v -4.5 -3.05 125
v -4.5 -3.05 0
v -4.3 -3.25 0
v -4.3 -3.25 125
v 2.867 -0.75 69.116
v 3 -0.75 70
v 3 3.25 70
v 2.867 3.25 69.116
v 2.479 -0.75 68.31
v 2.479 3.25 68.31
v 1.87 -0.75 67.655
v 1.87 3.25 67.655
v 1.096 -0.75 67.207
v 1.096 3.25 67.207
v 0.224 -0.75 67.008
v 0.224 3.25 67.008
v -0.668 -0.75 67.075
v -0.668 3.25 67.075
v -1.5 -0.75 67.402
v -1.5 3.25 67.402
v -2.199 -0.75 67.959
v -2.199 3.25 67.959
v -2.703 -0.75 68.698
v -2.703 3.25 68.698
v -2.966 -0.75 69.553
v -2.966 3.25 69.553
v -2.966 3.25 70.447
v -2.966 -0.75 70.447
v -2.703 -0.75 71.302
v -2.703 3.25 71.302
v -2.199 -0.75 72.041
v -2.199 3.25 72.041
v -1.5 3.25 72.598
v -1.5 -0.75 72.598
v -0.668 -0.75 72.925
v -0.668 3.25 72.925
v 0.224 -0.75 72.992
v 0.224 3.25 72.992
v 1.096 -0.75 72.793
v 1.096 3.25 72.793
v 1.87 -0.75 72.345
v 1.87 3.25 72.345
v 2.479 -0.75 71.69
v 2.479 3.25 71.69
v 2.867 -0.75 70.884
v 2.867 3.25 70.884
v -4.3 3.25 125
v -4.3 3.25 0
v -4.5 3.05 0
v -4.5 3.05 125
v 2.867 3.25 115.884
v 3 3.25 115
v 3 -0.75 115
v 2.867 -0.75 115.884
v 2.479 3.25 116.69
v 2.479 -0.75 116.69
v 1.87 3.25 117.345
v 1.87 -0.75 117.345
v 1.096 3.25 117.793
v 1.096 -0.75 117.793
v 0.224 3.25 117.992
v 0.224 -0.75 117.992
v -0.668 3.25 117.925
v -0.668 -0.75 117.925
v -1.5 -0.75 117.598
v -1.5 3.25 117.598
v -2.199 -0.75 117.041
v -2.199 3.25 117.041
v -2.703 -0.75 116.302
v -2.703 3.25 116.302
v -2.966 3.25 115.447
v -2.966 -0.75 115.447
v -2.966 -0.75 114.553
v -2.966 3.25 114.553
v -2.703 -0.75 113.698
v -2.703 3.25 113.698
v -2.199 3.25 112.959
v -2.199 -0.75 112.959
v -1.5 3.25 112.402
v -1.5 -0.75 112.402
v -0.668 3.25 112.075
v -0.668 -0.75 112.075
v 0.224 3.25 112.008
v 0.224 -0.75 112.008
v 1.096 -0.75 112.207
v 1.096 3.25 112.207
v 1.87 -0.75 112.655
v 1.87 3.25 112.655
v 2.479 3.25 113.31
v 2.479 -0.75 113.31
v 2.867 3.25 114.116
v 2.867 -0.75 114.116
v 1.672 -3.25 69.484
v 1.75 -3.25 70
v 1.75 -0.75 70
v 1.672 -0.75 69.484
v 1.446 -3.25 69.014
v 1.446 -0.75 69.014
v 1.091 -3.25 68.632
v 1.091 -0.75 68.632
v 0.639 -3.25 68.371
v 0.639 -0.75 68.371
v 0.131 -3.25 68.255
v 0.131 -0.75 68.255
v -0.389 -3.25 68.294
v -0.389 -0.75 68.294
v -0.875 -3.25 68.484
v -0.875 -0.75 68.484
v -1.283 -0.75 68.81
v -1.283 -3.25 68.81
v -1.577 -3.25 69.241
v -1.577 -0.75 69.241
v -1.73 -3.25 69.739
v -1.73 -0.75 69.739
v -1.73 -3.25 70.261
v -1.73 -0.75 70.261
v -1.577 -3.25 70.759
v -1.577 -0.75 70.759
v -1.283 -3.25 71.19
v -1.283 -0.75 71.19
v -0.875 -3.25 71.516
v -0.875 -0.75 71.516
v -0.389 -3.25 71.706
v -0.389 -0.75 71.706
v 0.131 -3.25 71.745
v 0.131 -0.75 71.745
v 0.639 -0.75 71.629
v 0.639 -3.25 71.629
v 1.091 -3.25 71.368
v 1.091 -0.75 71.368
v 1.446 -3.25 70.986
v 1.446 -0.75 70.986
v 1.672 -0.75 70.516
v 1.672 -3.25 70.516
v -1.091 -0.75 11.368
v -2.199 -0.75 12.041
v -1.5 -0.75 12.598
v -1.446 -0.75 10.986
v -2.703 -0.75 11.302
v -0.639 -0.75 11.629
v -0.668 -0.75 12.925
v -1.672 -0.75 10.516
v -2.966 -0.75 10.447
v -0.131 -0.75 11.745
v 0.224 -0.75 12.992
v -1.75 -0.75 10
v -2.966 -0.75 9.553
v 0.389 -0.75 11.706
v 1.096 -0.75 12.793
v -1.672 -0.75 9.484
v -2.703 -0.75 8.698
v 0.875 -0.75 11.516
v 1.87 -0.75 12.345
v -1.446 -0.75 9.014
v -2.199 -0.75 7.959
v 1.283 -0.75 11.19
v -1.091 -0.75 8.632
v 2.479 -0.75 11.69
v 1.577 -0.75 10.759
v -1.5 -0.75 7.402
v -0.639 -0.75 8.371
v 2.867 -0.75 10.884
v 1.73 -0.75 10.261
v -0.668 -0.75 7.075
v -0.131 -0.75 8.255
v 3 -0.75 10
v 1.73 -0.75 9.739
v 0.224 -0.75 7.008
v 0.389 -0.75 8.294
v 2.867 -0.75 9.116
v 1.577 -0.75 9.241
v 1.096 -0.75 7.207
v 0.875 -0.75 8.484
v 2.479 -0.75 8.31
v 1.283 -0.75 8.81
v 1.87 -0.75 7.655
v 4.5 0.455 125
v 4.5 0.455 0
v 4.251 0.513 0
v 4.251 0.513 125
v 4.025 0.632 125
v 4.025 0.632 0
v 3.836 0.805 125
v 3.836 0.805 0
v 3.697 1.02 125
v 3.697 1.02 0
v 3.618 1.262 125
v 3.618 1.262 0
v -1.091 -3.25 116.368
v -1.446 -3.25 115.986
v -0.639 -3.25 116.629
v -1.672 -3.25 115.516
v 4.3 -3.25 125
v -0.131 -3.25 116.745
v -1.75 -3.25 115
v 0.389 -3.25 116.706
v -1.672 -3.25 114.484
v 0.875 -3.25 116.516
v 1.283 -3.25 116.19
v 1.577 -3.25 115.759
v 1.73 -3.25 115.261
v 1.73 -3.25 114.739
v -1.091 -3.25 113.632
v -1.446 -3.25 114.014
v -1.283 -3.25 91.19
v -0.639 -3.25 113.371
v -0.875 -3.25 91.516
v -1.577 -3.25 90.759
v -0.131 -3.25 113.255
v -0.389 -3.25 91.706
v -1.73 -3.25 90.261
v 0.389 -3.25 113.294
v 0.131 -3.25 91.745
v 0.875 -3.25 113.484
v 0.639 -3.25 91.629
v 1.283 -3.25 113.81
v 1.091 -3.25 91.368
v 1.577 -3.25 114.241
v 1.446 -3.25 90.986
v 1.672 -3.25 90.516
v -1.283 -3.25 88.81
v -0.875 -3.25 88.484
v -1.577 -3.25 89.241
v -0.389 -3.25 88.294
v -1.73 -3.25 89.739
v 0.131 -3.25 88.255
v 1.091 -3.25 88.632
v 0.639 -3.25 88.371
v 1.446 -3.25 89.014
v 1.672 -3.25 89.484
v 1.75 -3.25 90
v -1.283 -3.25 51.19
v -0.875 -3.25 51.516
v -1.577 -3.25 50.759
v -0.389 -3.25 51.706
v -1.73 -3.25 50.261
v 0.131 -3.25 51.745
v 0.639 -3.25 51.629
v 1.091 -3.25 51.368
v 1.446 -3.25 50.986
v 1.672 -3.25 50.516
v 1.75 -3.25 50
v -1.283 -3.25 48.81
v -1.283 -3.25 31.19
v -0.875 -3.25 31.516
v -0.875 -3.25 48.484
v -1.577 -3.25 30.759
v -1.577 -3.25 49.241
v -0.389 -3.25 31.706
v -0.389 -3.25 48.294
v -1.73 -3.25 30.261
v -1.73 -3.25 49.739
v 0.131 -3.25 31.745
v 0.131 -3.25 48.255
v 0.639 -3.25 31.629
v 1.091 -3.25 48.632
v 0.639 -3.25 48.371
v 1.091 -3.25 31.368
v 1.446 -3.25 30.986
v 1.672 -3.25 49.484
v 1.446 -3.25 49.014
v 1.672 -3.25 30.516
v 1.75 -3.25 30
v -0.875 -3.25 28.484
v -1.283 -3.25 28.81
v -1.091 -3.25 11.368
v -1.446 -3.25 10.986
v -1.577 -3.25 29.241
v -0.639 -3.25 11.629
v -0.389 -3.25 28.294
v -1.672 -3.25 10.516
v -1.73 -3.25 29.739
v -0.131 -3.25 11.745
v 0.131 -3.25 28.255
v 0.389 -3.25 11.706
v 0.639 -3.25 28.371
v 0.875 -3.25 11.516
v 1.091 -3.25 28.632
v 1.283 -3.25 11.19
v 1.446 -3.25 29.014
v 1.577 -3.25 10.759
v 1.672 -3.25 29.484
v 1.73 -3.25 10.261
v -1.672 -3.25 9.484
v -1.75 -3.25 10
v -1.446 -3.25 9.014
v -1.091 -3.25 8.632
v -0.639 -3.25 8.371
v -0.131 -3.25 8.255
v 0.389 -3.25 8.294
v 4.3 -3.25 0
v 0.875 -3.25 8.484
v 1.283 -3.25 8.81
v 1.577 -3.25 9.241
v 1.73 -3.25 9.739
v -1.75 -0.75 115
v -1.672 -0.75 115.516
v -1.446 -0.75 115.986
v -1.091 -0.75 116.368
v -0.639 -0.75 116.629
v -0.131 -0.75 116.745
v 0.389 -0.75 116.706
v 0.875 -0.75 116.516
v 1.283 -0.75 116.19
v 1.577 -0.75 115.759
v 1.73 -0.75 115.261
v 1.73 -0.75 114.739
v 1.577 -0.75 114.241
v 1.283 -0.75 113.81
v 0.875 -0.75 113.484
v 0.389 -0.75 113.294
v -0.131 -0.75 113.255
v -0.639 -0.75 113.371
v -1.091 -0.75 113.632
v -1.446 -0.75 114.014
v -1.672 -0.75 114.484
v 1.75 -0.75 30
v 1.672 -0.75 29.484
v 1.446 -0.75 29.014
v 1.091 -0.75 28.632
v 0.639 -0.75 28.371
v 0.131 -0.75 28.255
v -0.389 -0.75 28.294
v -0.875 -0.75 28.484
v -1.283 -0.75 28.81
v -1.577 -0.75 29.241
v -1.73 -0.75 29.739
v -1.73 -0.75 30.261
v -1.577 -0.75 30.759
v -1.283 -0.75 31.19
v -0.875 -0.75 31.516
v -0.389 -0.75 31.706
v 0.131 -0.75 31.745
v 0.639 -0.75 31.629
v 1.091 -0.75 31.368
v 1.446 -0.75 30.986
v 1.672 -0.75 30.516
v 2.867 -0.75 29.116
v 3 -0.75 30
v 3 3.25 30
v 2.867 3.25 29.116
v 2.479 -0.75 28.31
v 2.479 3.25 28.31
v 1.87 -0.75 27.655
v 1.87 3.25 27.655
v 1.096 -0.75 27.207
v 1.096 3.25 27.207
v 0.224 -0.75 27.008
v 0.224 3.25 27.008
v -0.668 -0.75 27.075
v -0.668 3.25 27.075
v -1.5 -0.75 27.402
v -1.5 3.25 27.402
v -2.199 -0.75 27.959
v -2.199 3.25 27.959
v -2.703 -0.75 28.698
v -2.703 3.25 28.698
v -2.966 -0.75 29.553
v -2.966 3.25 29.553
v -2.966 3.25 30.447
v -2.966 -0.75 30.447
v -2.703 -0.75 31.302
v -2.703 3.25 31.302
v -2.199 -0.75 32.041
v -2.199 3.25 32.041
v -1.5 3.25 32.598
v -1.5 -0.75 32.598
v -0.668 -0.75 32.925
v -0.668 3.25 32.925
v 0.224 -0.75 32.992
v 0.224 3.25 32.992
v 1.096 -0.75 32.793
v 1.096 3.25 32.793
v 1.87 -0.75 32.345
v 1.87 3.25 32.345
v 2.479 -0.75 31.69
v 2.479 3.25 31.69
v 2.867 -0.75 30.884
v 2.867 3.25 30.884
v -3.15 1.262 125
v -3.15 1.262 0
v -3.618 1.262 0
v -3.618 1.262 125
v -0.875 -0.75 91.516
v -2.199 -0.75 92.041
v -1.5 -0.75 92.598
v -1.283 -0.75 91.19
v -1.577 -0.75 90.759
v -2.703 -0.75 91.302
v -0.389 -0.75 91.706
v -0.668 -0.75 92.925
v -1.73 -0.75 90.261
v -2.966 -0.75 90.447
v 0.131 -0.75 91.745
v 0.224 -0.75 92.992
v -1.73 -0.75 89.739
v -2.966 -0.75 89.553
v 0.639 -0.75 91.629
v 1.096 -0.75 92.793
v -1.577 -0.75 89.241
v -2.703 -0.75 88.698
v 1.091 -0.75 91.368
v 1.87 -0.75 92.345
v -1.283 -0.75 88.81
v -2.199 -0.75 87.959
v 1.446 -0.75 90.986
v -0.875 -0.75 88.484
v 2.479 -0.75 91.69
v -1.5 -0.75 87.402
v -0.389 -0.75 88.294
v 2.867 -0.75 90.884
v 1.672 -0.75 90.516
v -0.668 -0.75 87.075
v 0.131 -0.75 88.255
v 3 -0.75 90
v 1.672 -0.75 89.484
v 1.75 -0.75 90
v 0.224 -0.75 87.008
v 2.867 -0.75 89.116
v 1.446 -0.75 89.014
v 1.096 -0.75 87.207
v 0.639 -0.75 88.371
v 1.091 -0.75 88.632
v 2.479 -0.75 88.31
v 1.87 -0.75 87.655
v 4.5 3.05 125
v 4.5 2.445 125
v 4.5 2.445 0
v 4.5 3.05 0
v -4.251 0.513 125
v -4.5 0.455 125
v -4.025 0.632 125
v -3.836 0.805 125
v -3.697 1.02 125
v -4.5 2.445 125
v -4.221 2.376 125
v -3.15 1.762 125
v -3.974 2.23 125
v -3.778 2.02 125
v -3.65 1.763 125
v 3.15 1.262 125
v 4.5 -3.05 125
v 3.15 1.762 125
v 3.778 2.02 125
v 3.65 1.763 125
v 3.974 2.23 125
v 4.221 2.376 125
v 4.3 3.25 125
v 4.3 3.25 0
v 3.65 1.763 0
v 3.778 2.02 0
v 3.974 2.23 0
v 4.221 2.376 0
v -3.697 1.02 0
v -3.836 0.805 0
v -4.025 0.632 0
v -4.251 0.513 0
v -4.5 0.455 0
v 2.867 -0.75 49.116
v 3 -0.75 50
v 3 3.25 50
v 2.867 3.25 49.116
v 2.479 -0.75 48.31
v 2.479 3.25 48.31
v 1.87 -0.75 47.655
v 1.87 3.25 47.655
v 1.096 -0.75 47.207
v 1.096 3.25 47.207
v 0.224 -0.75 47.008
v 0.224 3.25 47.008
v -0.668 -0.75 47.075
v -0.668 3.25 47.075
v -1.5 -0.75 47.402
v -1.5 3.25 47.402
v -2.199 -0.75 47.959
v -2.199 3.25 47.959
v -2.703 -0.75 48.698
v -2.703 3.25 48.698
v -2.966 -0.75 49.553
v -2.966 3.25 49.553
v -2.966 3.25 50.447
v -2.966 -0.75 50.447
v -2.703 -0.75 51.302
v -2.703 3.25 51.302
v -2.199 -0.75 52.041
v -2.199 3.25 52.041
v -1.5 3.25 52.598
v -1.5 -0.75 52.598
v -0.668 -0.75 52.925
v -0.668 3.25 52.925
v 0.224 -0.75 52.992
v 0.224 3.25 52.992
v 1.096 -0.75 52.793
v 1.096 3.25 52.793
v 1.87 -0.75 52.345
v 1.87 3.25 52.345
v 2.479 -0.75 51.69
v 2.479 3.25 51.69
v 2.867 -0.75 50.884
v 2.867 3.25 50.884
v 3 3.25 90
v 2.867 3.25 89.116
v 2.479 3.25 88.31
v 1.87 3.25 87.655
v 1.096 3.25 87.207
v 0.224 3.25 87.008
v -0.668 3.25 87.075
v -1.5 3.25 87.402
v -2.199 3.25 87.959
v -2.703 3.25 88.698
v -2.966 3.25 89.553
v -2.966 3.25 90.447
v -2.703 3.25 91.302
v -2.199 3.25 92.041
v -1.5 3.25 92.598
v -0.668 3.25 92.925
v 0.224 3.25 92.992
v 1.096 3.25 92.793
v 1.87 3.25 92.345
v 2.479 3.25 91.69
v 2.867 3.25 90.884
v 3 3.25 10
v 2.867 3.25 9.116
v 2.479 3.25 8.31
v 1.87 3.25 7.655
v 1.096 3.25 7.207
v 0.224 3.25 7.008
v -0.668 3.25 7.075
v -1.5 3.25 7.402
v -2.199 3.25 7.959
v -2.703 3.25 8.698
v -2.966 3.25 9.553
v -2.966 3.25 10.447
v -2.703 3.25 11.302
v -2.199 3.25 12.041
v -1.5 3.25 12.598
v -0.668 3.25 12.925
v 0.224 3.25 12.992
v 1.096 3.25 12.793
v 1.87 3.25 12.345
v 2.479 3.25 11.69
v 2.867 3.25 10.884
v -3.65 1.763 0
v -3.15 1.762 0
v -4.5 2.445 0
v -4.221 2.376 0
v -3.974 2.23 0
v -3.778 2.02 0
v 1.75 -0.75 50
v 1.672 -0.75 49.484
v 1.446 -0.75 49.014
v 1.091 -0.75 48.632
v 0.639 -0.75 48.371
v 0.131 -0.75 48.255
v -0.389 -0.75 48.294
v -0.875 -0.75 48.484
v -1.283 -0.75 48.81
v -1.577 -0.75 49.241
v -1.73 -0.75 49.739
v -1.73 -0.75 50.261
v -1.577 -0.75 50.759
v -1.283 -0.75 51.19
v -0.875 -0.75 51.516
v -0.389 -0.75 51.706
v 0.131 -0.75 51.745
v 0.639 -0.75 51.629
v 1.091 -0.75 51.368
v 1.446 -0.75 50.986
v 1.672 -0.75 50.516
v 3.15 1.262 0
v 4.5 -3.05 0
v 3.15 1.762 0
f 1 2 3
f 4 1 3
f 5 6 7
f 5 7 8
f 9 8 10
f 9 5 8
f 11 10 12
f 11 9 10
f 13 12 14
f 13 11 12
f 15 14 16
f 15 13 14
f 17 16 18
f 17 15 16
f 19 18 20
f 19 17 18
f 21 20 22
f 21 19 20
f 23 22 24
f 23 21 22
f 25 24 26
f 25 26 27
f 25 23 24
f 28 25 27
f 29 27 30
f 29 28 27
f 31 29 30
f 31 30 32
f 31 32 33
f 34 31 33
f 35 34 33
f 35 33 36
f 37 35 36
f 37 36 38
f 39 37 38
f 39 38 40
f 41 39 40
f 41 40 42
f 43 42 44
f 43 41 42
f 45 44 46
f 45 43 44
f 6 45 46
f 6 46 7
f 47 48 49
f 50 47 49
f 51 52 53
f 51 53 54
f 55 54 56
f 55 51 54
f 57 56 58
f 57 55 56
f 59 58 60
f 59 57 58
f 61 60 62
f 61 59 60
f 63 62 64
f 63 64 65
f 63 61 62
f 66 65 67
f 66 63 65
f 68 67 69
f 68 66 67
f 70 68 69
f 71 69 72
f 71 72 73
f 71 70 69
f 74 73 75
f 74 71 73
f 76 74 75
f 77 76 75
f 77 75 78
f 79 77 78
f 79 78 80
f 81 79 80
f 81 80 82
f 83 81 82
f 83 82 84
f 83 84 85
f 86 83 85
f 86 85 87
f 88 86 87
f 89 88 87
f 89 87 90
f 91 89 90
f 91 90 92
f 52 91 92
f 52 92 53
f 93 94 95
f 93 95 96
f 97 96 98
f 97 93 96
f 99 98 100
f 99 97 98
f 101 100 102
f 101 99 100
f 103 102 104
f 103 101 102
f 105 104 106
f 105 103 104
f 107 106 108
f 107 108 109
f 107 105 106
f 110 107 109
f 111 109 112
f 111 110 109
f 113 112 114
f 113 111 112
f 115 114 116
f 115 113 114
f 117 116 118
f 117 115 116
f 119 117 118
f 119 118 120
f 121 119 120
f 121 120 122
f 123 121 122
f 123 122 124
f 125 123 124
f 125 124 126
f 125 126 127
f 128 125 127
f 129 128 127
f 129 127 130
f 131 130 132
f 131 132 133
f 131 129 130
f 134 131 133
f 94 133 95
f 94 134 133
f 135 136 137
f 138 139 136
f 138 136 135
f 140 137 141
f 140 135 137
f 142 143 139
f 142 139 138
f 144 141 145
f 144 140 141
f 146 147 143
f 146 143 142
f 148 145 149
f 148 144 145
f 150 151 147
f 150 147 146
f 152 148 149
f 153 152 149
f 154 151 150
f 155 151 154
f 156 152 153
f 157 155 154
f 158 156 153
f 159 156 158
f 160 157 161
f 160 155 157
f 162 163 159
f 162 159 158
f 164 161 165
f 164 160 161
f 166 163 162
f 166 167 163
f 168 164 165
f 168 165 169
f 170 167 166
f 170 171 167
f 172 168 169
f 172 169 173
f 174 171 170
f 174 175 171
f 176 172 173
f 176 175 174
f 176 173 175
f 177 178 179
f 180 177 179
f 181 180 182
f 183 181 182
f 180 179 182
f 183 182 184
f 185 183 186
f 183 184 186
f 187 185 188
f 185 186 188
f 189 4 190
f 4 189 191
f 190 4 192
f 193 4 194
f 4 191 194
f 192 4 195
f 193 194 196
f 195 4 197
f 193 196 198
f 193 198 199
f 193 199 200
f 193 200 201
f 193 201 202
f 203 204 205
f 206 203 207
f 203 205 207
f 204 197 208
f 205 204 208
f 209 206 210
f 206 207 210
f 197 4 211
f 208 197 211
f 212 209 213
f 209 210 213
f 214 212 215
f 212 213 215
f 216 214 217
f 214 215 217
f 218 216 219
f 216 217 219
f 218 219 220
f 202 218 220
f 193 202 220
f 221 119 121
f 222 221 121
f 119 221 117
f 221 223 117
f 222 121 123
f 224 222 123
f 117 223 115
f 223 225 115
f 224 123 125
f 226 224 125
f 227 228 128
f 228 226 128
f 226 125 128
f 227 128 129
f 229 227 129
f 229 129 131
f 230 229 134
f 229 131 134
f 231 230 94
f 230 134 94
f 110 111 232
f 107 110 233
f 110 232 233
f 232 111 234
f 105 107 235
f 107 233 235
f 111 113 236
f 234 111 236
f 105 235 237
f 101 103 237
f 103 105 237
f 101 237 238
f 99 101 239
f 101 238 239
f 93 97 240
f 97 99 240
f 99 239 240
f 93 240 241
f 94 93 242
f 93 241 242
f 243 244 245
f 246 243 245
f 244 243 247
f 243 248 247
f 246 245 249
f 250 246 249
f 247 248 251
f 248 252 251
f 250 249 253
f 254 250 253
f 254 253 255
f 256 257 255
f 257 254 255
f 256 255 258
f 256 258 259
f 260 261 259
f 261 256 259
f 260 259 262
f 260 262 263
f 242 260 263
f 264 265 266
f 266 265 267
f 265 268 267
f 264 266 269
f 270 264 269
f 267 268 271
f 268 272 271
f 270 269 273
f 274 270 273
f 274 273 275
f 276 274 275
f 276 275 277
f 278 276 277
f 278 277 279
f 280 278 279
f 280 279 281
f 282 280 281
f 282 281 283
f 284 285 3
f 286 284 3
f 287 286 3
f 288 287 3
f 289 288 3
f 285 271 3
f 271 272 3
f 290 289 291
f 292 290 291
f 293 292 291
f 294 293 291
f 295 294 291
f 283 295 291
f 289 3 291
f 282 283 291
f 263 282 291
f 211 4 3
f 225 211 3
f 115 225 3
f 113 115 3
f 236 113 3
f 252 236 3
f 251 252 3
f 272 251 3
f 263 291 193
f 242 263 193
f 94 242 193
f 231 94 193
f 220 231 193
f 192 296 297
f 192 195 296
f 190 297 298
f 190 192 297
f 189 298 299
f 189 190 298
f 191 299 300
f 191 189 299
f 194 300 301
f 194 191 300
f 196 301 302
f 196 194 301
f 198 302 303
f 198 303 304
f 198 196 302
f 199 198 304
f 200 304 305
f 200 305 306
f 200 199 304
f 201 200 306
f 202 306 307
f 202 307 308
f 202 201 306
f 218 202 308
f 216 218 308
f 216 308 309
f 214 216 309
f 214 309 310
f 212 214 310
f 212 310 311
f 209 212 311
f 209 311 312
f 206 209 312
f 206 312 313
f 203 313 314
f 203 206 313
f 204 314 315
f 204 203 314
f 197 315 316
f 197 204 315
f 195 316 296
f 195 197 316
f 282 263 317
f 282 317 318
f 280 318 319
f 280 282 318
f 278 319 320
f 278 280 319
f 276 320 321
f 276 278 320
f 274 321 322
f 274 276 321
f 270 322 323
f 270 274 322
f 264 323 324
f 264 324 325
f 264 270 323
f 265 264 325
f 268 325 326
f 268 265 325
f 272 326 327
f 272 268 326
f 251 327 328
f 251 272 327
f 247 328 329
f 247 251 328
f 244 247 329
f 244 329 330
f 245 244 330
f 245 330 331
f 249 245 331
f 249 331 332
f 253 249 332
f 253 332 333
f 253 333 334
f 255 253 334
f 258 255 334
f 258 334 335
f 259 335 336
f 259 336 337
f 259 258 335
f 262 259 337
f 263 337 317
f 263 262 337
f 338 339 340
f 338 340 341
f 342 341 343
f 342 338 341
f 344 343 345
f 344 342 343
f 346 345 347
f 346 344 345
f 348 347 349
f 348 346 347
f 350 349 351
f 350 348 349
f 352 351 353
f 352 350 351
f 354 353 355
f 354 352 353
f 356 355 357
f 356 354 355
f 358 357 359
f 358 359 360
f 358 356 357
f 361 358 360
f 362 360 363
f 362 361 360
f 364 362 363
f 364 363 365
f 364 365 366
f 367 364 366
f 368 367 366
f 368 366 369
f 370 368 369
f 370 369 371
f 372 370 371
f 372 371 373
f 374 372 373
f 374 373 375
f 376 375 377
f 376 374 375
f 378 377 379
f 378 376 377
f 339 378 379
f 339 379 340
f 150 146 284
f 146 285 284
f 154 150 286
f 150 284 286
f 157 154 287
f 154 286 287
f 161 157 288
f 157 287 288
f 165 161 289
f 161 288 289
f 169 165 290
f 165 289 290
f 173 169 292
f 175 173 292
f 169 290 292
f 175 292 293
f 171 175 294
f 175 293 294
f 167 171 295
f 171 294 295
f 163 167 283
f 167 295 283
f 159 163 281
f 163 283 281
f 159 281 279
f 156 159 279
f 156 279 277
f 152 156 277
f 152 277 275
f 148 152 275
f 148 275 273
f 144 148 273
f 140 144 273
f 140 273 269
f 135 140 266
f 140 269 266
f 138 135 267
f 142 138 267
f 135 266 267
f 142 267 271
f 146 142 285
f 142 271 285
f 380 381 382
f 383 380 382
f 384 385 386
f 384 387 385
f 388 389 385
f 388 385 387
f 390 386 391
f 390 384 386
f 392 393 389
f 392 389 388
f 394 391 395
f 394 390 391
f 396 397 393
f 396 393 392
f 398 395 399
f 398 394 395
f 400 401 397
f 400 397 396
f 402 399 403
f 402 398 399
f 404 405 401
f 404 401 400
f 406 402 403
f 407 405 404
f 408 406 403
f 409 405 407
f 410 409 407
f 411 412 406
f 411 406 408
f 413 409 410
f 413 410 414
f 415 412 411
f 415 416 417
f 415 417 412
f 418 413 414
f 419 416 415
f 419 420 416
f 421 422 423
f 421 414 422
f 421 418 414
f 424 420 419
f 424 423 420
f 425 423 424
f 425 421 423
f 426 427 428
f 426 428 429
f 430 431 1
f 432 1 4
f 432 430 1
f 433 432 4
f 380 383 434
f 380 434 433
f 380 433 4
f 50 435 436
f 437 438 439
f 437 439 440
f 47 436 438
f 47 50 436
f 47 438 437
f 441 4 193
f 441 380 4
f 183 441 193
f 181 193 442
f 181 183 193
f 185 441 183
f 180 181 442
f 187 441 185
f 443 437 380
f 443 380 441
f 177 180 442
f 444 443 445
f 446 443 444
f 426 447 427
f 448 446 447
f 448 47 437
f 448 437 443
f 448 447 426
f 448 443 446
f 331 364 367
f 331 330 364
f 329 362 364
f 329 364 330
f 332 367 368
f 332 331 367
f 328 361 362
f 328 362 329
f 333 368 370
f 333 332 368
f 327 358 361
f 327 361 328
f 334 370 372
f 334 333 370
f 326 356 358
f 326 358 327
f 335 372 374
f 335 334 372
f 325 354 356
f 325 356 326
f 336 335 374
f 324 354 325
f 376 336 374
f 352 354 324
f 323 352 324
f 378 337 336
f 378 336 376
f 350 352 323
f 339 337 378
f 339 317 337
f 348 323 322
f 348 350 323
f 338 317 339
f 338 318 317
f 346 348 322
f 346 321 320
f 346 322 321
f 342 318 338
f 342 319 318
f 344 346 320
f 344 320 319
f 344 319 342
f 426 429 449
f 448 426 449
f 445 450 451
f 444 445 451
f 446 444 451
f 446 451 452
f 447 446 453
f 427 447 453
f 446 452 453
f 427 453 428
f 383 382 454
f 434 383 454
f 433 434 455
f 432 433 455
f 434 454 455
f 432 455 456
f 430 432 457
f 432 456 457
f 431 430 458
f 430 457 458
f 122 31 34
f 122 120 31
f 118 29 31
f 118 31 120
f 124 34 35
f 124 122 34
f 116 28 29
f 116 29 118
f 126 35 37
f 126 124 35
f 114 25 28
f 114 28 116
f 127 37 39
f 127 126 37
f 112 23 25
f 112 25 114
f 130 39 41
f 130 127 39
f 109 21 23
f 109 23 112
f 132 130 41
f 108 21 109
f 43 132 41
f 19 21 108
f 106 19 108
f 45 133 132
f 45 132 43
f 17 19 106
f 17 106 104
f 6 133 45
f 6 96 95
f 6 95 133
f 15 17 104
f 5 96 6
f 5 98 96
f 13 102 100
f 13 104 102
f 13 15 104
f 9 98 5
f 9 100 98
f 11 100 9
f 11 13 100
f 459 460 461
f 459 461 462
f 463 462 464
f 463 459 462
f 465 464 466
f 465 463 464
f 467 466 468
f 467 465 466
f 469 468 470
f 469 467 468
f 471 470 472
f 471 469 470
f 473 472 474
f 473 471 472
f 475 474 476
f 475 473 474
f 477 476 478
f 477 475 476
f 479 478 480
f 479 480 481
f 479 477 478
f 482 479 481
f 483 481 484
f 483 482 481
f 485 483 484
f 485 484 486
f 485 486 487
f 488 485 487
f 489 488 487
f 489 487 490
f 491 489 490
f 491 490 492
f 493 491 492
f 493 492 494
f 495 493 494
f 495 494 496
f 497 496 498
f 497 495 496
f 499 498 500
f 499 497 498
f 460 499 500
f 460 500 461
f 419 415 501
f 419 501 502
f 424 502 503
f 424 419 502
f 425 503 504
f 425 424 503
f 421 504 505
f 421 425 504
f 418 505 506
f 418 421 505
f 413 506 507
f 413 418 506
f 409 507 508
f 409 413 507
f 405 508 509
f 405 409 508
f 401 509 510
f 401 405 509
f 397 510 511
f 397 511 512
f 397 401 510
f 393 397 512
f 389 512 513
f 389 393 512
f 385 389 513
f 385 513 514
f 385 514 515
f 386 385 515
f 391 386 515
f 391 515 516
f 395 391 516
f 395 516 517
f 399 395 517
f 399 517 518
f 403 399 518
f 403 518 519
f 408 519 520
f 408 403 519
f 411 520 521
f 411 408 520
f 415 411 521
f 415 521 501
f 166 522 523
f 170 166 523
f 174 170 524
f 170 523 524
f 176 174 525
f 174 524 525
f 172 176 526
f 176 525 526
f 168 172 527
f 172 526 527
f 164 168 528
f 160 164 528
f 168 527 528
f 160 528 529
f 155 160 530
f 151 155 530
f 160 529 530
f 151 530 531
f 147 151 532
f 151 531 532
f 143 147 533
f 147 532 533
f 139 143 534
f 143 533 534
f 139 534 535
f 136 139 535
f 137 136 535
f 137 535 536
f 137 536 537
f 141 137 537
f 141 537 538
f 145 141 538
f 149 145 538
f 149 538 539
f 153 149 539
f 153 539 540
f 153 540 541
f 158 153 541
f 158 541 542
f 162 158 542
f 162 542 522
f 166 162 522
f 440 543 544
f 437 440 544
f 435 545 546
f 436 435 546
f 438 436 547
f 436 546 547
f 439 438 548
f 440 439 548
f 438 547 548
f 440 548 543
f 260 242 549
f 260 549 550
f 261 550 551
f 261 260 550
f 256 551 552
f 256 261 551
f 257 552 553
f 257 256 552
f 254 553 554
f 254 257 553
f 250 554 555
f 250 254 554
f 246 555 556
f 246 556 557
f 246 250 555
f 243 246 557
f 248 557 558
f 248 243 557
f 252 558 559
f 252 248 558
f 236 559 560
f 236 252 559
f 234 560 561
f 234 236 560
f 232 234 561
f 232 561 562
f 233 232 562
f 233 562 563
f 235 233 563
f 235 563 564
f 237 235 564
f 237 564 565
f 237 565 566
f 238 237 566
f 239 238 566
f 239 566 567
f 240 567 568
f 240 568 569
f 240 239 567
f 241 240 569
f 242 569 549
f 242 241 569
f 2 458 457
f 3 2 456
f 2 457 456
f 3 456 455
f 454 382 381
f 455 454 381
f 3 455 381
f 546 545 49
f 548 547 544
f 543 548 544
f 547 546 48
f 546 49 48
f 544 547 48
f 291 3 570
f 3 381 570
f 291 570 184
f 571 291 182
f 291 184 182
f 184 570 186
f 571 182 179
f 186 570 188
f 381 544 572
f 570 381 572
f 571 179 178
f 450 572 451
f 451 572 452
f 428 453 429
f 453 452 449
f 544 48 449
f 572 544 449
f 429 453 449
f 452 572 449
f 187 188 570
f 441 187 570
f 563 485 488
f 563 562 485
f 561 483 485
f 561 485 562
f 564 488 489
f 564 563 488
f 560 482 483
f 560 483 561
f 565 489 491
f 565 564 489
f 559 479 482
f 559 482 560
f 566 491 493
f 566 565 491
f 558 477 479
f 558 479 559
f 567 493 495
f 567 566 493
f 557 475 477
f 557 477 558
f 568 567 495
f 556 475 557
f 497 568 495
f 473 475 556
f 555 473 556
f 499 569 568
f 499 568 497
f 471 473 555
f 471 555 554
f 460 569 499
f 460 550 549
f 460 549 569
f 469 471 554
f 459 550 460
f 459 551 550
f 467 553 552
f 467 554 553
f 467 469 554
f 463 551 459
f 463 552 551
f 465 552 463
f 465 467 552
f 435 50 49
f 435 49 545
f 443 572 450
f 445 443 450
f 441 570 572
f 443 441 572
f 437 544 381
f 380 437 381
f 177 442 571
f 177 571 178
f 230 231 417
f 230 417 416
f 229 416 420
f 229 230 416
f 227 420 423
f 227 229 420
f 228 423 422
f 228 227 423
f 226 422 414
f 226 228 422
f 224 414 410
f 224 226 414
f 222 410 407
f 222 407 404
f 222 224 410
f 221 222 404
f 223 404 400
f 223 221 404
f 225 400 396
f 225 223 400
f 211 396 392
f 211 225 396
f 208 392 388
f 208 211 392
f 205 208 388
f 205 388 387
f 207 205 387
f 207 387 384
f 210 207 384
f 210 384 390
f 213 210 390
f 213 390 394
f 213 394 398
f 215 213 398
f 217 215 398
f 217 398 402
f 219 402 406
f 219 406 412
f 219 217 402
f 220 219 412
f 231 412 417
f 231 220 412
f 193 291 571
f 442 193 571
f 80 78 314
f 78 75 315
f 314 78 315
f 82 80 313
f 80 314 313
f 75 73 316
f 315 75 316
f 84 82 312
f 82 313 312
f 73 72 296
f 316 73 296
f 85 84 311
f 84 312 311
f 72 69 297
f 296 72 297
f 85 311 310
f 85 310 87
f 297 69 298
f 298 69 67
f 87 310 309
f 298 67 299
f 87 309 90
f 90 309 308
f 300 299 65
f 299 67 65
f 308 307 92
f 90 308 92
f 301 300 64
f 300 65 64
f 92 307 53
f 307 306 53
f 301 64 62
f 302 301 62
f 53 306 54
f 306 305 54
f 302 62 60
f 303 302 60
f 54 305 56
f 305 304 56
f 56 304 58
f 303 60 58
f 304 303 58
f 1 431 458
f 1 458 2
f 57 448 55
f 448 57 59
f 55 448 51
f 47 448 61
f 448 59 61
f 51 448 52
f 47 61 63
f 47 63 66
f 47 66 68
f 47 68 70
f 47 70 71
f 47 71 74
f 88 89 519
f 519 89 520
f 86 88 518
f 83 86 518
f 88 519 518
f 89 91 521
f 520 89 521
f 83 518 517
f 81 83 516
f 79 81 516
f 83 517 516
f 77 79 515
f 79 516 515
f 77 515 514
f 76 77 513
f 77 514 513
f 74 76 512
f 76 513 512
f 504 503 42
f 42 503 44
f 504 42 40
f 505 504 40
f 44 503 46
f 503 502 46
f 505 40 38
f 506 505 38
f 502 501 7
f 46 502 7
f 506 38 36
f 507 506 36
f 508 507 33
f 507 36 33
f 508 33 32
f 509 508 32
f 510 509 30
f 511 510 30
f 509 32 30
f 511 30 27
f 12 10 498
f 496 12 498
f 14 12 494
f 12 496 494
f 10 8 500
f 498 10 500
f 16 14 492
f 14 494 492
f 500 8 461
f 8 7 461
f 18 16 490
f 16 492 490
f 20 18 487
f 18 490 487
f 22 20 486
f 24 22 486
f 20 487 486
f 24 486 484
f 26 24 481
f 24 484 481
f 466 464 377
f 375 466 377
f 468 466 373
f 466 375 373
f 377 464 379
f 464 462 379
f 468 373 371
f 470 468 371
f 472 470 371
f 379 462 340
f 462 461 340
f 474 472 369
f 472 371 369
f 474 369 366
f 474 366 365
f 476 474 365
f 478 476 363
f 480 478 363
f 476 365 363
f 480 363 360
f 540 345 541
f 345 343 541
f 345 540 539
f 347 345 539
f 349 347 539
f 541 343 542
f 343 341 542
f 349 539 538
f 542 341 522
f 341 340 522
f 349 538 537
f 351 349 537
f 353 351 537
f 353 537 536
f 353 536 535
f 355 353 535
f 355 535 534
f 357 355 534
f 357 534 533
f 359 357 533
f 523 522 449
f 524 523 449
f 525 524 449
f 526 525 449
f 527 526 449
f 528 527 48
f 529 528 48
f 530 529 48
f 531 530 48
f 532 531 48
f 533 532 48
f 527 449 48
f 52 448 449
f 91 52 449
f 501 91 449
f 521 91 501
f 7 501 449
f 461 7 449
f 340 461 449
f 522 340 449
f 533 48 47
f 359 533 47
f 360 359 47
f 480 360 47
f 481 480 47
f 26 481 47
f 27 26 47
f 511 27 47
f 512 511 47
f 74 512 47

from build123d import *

# Parameters (mm, degrees)
EXTRUDE_RAIL_PROFILE_DEPTH     = 125
CBORE_FOR_M3_SHCS2_D           = 3.5
CBORE_FOR_M3_SHCS2_CBORE_D     = 6
CBORE_FOR_M3_SHCS2_CBORE_DEPTH = 4
FILL_START                     = -0.75
FILL_PATTERN_OUTLINE_R         = 3
FILL_PATTERN_DEPTH             = 4
FILL_START_2                   = -3.25
FILL_PATTERN_2_OUTLINE_R       = 1.75
FILL_PATTERN_2_DEPTH           = 2.5


# Read off the part's stored shape, not the designer's step: Fill Pattern
with BuildPart() as part:
    # Sketch1 → Extrude Rail Profile (new body)
    with BuildSketch(Plane.XY):
        with BuildLine():
            Line((-4.3, -3.25), (4.3, -3.25))
            Line((4.3, -3.25), (4.5, -3.05))
            Line((4.5, -3.05), (4.5, 0.455012563))
            ThreePointArc((4.5, 0.455012563), (3.924845827, 0.712323349), (3.617735397, 1.2625))
            Line((3.617735397, 1.2625), (3.15008224, 1.2625))
            Line((3.15008224, 1.2625), (3.15008224, 1.7625))
            Line((3.15008224, 1.7625), (3.65008224, 1.7625))
            ThreePointArc((3.65008224, 1.7625), (3.973877727, 2.229724887), (4.5, 2.444987437))
            Line((4.5, 2.444987437), (4.5, 3.05))
            Line((4.5, 3.05), (4.3, 3.25))
            Line((4.3, 3.25), (-4.3, 3.25))
            Line((-4.3, 3.25), (-4.5, 3.05))
            Line((-4.5, 3.05), (-4.5, 2.444987437))
            ThreePointArc((-4.5, 2.444987437), (-3.973877727, 2.229724887), (-3.65008224, 1.7625))
            Line((-3.65008224, 1.7625), (-3.15008224, 1.7625))
            Line((-3.15008224, 1.7625), (-3.15008224, 1.2625))
            Line((-3.15008224, 1.2625), (-3.617735397, 1.2625))
            ThreePointArc((-3.617735397, 1.2625), (-3.924845827, 0.712323349), (-4.5, 0.455012563))
            Line((-4.5, 0.455012563), (-4.5, -3.05))
            Line((-4.5, -3.05), (-4.3, -3.25))
        make_face()
    extrude(amount=EXTRUDE_RAIL_PROFILE_DEPTH)

    # CBORE for M3 SHCS2 (through all)
    with Locations(Plane(origin=(0, 3.25, 0), x_dir=(1, 0, 0), z_dir=(0, 1, 0))):
        with Locations((0, -10)):
            cbore_for_m3_shcs2 = CounterBoreHole(CBORE_FOR_M3_SHCS2_D / 2, CBORE_FOR_M3_SHCS2_CBORE_D / 2, CBORE_FOR_M3_SHCS2_CBORE_DEPTH)

    # Mirror 2: CBORE for M3 SHCS2 across plane
    add(cbore_for_m3_shcs2.mirror(Plane.XY.offset(62.5)), mode=Mode.SUBTRACT)

    # Fill Pattern outline → Fill Pattern (cut)
    with BuildSketch(Plane(origin=(0, 0, 0), x_dir=(1, 0, 0), z_dir=(0, 1, 0)).offset(FILL_START)):
        with Locations((0, -30)):
            Circle(FILL_PATTERN_OUTLINE_R)
        with Locations((0, -50)):
            Circle(FILL_PATTERN_OUTLINE_R)
        with Locations((0, -70)):
            Circle(FILL_PATTERN_OUTLINE_R)
        with Locations((0, -90)):
            Circle(FILL_PATTERN_OUTLINE_R)
    extrude(amount=FILL_PATTERN_DEPTH, mode=Mode.SUBTRACT)

    # Fill Pattern 2 outline → Fill Pattern 2 (cut)
    with BuildSketch(Plane(origin=(0, 0, 0), x_dir=(1, 0, 0), z_dir=(0, 1, 0)).offset(FILL_START_2)):
        with Locations((0, -30)):
            Circle(FILL_PATTERN_2_OUTLINE_R)
        with Locations((0, -50)):
            Circle(FILL_PATTERN_2_OUTLINE_R)
        with Locations((0, -70)):
            Circle(FILL_PATTERN_2_OUTLINE_R)
        with Locations((0, -90)):
            Circle(FILL_PATTERN_2_OUTLINE_R)
    extrude(amount=FILL_PATTERN_2_DEPTH, mode=Mode.SUBTRACT)


solid = part.part
